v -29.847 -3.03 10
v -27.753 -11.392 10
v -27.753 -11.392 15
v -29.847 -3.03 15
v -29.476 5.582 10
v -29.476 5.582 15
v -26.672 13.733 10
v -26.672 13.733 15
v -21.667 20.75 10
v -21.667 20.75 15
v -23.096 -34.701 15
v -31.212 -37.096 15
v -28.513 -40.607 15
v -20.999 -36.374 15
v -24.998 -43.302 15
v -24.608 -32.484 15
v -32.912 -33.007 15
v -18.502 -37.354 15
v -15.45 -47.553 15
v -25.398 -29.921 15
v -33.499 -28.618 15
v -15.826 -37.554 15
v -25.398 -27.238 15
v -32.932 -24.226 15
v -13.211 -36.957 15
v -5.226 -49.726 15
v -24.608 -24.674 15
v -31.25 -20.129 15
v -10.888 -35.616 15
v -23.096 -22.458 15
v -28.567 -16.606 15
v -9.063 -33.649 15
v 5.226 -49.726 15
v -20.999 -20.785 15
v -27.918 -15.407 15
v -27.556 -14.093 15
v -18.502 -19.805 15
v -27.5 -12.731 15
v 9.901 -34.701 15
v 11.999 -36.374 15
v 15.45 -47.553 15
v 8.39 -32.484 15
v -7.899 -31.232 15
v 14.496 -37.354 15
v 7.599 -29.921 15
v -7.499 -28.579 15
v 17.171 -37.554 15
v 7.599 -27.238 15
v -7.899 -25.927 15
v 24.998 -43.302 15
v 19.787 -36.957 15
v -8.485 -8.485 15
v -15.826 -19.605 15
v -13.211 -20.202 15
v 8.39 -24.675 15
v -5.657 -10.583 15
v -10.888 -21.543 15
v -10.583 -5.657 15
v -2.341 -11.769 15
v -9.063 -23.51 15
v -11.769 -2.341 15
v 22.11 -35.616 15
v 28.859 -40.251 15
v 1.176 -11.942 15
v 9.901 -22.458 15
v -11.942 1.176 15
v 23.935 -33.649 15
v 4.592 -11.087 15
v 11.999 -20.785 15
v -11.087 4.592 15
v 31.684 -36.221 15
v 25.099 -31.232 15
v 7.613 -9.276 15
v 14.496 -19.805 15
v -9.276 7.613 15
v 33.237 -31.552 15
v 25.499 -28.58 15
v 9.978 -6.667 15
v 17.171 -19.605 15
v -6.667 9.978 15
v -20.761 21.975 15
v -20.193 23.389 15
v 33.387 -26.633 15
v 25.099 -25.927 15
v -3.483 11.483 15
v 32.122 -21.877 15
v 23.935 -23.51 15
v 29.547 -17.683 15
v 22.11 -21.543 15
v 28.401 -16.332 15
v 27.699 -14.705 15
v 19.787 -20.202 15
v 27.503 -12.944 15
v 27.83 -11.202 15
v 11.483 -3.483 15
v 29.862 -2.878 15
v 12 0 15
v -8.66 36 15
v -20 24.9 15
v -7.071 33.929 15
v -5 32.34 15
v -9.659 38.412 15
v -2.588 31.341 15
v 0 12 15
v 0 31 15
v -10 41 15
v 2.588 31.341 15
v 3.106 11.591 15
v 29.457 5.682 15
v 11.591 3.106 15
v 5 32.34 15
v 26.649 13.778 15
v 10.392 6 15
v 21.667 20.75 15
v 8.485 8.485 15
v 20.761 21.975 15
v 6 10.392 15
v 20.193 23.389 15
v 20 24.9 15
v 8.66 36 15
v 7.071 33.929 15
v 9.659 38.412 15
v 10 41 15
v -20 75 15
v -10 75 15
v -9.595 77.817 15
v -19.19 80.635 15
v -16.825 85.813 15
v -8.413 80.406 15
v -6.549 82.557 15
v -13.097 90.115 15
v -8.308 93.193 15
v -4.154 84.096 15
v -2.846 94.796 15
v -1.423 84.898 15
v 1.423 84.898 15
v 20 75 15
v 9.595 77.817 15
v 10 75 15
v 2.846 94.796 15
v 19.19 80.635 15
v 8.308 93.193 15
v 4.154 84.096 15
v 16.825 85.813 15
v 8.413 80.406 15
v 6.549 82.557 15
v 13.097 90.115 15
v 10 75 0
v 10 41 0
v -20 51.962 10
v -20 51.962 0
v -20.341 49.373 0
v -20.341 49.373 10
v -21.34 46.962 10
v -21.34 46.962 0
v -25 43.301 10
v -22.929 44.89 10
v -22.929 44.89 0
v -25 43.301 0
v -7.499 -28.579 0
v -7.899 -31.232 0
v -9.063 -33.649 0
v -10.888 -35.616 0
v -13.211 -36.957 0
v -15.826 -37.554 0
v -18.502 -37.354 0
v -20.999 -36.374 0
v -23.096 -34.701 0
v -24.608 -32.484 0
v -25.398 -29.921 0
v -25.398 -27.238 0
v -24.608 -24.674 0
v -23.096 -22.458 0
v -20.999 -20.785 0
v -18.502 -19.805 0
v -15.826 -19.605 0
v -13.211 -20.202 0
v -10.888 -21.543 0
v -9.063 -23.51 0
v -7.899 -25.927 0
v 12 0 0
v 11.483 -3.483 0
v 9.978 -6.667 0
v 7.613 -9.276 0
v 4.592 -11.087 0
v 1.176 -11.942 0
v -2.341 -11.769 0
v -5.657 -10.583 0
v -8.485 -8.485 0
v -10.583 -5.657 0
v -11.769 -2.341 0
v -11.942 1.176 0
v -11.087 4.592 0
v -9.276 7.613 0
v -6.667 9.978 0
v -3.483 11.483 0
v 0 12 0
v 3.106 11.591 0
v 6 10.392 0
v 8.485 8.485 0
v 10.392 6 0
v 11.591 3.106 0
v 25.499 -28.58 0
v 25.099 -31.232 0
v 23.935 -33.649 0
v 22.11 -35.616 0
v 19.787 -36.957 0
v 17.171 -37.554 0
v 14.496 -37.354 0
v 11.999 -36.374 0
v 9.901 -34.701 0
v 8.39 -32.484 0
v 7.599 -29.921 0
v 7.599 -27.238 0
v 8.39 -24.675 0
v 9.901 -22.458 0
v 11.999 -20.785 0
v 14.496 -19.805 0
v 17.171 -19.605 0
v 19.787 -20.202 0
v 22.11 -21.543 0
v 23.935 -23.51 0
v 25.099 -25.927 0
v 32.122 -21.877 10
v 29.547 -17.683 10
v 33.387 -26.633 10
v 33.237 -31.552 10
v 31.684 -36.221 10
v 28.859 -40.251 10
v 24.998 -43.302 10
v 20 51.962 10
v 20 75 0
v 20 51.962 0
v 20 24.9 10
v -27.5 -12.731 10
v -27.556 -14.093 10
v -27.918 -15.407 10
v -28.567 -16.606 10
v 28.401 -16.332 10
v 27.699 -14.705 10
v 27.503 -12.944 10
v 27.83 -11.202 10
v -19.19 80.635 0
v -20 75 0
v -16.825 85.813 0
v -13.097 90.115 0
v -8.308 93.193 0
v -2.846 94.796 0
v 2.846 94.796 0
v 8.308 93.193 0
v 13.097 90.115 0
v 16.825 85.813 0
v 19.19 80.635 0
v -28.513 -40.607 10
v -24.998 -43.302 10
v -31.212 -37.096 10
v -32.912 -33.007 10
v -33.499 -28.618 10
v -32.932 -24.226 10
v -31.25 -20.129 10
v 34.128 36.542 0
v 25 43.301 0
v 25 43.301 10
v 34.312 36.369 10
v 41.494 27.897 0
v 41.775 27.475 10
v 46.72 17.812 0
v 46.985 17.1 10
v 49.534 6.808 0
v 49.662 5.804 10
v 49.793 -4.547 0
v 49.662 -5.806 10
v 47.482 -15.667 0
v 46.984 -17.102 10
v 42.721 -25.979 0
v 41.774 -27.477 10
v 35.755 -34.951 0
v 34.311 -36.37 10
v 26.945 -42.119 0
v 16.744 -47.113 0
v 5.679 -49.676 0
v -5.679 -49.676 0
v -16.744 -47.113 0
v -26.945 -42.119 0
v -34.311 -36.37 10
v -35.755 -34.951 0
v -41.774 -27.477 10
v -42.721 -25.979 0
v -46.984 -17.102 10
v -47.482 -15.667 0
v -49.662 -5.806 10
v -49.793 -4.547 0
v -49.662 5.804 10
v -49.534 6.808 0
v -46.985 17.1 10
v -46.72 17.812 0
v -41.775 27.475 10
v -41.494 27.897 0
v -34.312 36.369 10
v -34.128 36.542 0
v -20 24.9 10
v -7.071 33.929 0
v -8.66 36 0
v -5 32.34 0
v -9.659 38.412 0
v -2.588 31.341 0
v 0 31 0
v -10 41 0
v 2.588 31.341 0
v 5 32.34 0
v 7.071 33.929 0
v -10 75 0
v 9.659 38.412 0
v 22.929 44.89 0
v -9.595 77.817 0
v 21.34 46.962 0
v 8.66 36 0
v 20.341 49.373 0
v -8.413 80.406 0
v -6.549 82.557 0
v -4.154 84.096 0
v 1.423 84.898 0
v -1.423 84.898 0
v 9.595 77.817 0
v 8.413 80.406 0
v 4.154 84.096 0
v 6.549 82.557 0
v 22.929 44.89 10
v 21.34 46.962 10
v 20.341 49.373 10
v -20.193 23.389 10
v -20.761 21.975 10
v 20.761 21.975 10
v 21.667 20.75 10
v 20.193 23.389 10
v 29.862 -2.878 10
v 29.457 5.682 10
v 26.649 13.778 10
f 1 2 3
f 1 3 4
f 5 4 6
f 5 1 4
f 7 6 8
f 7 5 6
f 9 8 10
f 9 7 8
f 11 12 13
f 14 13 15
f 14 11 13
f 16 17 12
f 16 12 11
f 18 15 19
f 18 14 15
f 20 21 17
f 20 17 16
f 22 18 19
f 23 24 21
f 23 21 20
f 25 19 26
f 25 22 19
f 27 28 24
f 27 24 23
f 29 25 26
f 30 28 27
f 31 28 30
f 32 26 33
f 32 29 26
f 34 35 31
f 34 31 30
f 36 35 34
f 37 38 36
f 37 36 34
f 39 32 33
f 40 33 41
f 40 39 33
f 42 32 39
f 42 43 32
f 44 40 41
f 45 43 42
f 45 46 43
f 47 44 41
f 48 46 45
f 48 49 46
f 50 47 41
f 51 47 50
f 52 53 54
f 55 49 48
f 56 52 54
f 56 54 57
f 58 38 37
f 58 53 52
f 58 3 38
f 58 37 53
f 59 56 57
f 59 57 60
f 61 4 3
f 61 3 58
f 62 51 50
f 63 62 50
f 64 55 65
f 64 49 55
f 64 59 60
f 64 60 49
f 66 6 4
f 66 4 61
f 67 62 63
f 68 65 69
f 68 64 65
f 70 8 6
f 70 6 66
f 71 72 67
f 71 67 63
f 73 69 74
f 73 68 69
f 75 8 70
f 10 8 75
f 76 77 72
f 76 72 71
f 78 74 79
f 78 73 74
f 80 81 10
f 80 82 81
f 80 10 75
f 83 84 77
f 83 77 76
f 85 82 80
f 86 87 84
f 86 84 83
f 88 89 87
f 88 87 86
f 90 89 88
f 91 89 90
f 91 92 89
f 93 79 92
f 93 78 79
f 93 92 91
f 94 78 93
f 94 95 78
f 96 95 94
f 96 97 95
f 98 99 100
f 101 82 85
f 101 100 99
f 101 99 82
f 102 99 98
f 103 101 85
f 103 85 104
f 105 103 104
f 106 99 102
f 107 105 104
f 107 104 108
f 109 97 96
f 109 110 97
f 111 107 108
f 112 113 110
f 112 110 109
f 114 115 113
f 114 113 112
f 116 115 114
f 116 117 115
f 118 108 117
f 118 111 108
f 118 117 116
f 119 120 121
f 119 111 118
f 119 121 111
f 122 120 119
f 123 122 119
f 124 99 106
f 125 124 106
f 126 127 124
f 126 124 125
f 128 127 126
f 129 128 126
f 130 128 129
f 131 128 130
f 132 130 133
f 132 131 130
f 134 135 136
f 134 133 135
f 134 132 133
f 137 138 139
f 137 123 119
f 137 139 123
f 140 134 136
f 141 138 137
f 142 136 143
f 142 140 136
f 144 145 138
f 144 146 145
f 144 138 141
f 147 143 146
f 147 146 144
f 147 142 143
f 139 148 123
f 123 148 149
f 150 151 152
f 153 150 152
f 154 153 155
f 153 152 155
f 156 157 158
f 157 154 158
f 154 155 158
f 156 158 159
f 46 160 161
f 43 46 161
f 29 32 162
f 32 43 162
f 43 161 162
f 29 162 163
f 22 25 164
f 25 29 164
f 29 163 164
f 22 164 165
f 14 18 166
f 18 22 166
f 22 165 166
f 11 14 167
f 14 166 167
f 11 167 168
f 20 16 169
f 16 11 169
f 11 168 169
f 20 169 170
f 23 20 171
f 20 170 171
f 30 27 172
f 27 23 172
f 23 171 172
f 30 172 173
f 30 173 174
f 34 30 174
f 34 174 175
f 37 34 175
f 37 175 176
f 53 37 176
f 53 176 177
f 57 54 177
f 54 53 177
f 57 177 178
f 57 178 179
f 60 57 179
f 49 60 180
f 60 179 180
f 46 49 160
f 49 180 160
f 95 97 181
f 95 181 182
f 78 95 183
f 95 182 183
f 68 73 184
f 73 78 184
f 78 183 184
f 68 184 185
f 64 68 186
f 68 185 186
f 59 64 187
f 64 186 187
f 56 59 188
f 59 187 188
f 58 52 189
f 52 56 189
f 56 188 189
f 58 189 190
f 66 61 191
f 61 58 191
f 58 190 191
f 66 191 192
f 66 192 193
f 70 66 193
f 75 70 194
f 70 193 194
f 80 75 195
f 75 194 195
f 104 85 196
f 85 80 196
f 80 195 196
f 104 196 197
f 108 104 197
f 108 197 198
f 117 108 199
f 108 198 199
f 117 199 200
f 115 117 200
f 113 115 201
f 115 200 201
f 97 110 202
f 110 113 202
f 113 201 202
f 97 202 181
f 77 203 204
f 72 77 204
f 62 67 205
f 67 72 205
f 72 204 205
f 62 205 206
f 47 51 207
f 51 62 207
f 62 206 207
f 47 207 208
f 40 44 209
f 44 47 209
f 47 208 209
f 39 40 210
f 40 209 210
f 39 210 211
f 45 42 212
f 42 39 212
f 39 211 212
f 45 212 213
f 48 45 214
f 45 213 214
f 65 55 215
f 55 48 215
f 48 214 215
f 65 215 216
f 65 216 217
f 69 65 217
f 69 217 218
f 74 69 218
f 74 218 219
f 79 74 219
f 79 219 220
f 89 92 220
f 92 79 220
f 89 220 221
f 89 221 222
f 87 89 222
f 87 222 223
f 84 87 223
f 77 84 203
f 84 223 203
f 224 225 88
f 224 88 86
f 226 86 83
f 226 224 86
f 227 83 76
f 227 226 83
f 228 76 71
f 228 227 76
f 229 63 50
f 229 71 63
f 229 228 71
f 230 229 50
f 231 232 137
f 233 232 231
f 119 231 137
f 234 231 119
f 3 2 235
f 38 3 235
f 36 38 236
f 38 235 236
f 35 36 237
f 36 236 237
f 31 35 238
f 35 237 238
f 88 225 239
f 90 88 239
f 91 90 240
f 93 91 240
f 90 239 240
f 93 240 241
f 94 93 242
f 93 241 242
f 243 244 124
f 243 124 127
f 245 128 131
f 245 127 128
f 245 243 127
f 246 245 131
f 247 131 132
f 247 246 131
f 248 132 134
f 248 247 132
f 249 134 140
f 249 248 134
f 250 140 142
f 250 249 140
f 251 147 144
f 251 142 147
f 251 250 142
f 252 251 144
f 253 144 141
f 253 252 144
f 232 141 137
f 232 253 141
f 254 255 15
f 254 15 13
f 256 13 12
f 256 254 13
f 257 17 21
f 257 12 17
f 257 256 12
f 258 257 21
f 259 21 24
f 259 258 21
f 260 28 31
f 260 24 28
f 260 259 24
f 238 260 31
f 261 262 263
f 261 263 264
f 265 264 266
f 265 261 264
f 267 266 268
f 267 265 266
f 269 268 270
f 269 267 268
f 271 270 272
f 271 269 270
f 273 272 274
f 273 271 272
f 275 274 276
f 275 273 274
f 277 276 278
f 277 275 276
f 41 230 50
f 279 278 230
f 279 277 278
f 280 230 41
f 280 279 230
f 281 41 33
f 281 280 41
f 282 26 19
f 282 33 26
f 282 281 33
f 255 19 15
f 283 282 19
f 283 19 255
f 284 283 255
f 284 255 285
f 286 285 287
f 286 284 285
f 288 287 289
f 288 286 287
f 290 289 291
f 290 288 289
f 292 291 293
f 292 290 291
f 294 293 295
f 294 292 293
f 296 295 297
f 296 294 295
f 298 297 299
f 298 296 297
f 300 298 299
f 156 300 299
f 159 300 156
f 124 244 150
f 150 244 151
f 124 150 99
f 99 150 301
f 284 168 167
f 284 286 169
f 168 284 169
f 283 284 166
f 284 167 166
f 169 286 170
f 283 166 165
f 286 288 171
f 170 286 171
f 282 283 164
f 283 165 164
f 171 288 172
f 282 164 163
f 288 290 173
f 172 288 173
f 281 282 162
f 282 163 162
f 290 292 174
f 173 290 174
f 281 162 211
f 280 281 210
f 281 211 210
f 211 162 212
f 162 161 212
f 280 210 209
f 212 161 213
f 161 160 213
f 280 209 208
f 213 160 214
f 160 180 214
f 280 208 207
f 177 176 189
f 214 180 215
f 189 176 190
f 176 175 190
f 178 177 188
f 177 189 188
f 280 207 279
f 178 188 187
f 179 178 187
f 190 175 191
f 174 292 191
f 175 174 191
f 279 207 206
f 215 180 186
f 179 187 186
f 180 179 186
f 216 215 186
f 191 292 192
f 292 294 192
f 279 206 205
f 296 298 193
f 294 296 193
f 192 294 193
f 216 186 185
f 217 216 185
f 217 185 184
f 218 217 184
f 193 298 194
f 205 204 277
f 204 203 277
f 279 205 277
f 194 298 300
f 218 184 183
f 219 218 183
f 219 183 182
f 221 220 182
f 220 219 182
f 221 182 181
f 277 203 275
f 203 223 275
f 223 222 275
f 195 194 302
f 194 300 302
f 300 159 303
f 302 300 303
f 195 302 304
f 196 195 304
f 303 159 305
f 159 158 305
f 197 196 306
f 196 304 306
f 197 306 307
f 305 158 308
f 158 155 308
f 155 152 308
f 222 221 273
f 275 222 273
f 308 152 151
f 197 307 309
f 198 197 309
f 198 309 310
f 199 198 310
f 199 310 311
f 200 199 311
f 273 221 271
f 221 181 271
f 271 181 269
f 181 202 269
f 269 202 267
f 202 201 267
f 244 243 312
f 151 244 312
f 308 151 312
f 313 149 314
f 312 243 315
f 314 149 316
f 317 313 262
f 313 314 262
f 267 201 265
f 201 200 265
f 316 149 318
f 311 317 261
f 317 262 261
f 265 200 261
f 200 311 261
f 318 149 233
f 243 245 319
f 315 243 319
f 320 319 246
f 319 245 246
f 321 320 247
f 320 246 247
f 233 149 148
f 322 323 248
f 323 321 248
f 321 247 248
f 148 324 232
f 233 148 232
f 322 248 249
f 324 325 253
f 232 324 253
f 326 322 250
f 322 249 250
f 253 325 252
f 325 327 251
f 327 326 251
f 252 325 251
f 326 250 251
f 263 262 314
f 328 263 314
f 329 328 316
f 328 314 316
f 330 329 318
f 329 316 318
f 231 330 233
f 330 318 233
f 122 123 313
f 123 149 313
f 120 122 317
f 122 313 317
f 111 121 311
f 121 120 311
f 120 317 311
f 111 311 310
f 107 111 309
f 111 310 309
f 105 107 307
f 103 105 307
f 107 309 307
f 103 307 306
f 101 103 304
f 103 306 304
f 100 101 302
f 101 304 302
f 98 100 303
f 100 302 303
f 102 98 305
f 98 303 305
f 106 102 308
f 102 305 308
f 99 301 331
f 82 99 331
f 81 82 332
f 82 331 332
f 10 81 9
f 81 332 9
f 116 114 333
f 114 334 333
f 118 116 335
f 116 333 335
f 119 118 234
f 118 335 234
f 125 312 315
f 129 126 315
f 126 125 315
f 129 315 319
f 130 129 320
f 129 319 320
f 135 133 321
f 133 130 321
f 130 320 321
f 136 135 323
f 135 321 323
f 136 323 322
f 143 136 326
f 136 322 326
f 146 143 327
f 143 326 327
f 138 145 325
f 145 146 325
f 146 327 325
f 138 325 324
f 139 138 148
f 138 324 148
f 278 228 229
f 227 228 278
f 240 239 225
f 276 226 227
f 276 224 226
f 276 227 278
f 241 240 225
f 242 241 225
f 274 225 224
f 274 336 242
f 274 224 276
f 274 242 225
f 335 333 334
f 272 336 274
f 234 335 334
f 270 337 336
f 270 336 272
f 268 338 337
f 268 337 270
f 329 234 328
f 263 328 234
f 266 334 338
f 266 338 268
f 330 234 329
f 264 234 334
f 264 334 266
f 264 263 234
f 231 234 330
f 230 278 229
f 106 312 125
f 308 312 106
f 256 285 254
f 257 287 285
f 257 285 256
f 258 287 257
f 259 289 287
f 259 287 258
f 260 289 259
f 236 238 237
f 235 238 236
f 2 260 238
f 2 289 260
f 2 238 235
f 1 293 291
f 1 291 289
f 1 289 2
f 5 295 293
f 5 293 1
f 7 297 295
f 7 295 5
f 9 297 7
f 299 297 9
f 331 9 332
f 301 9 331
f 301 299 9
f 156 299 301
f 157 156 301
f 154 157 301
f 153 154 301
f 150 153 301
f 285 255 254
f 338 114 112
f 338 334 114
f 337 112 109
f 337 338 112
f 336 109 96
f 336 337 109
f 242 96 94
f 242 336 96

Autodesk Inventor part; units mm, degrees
ref_plane "YZ Plane" through (0, 0, 0) normal (1, 0, 0) x (0, 1, 0)
ref_plane "XZ Plane" through (0, 0, 0) normal (0, 1, 0) x (-1, 0, 0)
ref_plane "XY Plane" through (0, 0, 0) normal (0, 0, 1) x (1, 0, 0)
sketch "Эскиз1" plane through (0, 0, 0) normal (0, 0, 1) x (1, 0, 0)
  arc A0 (-25, 43.3013) -> (25, 43.3013) centre (0, 0) ccw
  circle A1 centre (0, 0) radius 12
  line L0 (-50, 0) -> (50, 0) construction
  line L1 (0, 0) -> (-24.9984, -43.3022) construction
  line L2 (0, 0) -> (25.0049, -43.3022) construction
  circle A2 centre (0, 0) radius 33 construction
  circle A3 centre (-16.499, -28.5794) radius 9
  circle A4 centre (16.4989, -28.5795) radius 9
  arc A5 (-28.5669, -16.606) -> (-28.0784, -10.5643) centre (-33.4841, -13.1678) ccw
  arc A6 (-26.1975, -14.6174) -> (-26.1978, -14.6176) centre (-16.499, -28.5794) ccw
  arc A7 (-28.5357, -16.5745) -> (-24.9984, -43.3022) centre (-16.499, -28.5794) ccw
  line L3 (0, 0) -> (0, 75)
  arc A8 (20, 75) -> (-20, 75) centre (0, 75) ccw
  arc A9 (10, 75) -> (-10, 75) centre (0, 75) ccw
  line L4 (0, 75) -> (0, 41)
  arc A10 (-20, 41) -> (20, 41) centre (0, 41) ccw construction
  arc A11 (-10, 41) -> (10, 41) centre (0, 41) ccw
  line L5 (-10, 75) -> (-10, 41)
  line L6 (10, 75) -> (10, 41)
  line L7 (0, 21) -> (-26, 21) construction
  line L8 (0, 21) -> (26, 21) construction
  line L9 (-28.0784, -10.5643) -> (28.0784, -10.5643) construction
  arc A12 (28.0091, -10.7467) -> (29.5474, -17.6828) centre (33.4989, -13.1678) ccw
  arc A13 (-0.4419, -29.9967) -> (0.0837, -32.9999) centre (16.4989, -28.5795) ccw
  arc A14 (24.9984, -43.3022) -> (28.5357, -16.5746) centre (16.4989, -28.5795) ccw
  arc A15 (-25, 43.3013) -> (-20, 51.9615) centre (-30, 51.9615) ccw
  arc A16 (20, 51.9615) -> (25, 43.3013) centre (30, 51.9615) ccw
  arc A17 (20, 24.8998) -> (21.6667, 20.7498) centre (26, 24.8998) ccw
  arc A18 (-21.6667, 20.7498) -> (-20, 24.8998) centre (-26, 24.8998) ccw
  arc A19 (-21.4243, 21) -> (-27.753, -11.3916) centre (0, 0) ccw
  arc A20 (27.8299, -11.2025) -> (21.4243, 21) centre (0, 0) ccw
  arc A21 (-24.9984, -43.3022) -> (24.9984, -43.3022) centre (0, 0) ccw
  line L10 (-20, 75) -> (-20, 51.9615)
  line L11 (20, 75) -> (20, 51.9615)
  line L12 (20, 51.9615) -> (20, 24.8998)
  line L13 (-20, 51.9615) -> (-20, 24.8998)
  dimension "d0" = 100
  dimension "d1" = 24
  dimension "d2" = 66
  dimension "d3" = 18
  dimension "d4" = 18
  dimension "d7" = 12
  dimension "d10" = 75
  dimension "d11" = 20
  dimension "d12" = 10
  dimension "d13" = 34
  dimension "d14" = 20
  dimension "d15" = 10
  dimension "d24" = 26
  dimension "d25" = 26
  dimension "d29" = 12
  dimension "d30" = 20
  dimension "d31" = 20
  dimension "d32" = 17
  dimension "d37" = 21
  dimension "d38" = 31.5643
  dimension "d40" = 34.1678
  dimension "d66" = 12
  dimension "d67" = 12
  dimension "d68" = 30
  dimension "d69" = 30
  dimension "d70" = 30.004
  dimension "d71" = 150.002
  dimension "d72" = 13.4989
  dimension "d73" = 9.5474
  dimension "d74" = 8.0784
  dimension "d75" = 8.0091
  dimension "d76" = 5.0049
  dimension "d77" = 0
  dimension "d78" = 20.4419
  dimension "d79" = 46.1975
  dimension "d80" = 46.1978
  dimension "d81" = 47.753
  dimension "d82" = 48.0784
extrude "Выдавливание1" add sketch "Эскиз1" along normal blind 10 contours A15 L13 A18 A19 A5 A6 A0 | A14 A12 A20 A17 L12 A16 A0 | A12 A14
extrude "Выдавливание2" add sketch "Эскиз1" along normal blind 15 contours A6 A5 A19 A18 L13 L10 A8 L11 L12 A17 A20 A12 A14 A0 | A6 | A19 A5 | A12 A20
properties part number "лаб,2_2"
